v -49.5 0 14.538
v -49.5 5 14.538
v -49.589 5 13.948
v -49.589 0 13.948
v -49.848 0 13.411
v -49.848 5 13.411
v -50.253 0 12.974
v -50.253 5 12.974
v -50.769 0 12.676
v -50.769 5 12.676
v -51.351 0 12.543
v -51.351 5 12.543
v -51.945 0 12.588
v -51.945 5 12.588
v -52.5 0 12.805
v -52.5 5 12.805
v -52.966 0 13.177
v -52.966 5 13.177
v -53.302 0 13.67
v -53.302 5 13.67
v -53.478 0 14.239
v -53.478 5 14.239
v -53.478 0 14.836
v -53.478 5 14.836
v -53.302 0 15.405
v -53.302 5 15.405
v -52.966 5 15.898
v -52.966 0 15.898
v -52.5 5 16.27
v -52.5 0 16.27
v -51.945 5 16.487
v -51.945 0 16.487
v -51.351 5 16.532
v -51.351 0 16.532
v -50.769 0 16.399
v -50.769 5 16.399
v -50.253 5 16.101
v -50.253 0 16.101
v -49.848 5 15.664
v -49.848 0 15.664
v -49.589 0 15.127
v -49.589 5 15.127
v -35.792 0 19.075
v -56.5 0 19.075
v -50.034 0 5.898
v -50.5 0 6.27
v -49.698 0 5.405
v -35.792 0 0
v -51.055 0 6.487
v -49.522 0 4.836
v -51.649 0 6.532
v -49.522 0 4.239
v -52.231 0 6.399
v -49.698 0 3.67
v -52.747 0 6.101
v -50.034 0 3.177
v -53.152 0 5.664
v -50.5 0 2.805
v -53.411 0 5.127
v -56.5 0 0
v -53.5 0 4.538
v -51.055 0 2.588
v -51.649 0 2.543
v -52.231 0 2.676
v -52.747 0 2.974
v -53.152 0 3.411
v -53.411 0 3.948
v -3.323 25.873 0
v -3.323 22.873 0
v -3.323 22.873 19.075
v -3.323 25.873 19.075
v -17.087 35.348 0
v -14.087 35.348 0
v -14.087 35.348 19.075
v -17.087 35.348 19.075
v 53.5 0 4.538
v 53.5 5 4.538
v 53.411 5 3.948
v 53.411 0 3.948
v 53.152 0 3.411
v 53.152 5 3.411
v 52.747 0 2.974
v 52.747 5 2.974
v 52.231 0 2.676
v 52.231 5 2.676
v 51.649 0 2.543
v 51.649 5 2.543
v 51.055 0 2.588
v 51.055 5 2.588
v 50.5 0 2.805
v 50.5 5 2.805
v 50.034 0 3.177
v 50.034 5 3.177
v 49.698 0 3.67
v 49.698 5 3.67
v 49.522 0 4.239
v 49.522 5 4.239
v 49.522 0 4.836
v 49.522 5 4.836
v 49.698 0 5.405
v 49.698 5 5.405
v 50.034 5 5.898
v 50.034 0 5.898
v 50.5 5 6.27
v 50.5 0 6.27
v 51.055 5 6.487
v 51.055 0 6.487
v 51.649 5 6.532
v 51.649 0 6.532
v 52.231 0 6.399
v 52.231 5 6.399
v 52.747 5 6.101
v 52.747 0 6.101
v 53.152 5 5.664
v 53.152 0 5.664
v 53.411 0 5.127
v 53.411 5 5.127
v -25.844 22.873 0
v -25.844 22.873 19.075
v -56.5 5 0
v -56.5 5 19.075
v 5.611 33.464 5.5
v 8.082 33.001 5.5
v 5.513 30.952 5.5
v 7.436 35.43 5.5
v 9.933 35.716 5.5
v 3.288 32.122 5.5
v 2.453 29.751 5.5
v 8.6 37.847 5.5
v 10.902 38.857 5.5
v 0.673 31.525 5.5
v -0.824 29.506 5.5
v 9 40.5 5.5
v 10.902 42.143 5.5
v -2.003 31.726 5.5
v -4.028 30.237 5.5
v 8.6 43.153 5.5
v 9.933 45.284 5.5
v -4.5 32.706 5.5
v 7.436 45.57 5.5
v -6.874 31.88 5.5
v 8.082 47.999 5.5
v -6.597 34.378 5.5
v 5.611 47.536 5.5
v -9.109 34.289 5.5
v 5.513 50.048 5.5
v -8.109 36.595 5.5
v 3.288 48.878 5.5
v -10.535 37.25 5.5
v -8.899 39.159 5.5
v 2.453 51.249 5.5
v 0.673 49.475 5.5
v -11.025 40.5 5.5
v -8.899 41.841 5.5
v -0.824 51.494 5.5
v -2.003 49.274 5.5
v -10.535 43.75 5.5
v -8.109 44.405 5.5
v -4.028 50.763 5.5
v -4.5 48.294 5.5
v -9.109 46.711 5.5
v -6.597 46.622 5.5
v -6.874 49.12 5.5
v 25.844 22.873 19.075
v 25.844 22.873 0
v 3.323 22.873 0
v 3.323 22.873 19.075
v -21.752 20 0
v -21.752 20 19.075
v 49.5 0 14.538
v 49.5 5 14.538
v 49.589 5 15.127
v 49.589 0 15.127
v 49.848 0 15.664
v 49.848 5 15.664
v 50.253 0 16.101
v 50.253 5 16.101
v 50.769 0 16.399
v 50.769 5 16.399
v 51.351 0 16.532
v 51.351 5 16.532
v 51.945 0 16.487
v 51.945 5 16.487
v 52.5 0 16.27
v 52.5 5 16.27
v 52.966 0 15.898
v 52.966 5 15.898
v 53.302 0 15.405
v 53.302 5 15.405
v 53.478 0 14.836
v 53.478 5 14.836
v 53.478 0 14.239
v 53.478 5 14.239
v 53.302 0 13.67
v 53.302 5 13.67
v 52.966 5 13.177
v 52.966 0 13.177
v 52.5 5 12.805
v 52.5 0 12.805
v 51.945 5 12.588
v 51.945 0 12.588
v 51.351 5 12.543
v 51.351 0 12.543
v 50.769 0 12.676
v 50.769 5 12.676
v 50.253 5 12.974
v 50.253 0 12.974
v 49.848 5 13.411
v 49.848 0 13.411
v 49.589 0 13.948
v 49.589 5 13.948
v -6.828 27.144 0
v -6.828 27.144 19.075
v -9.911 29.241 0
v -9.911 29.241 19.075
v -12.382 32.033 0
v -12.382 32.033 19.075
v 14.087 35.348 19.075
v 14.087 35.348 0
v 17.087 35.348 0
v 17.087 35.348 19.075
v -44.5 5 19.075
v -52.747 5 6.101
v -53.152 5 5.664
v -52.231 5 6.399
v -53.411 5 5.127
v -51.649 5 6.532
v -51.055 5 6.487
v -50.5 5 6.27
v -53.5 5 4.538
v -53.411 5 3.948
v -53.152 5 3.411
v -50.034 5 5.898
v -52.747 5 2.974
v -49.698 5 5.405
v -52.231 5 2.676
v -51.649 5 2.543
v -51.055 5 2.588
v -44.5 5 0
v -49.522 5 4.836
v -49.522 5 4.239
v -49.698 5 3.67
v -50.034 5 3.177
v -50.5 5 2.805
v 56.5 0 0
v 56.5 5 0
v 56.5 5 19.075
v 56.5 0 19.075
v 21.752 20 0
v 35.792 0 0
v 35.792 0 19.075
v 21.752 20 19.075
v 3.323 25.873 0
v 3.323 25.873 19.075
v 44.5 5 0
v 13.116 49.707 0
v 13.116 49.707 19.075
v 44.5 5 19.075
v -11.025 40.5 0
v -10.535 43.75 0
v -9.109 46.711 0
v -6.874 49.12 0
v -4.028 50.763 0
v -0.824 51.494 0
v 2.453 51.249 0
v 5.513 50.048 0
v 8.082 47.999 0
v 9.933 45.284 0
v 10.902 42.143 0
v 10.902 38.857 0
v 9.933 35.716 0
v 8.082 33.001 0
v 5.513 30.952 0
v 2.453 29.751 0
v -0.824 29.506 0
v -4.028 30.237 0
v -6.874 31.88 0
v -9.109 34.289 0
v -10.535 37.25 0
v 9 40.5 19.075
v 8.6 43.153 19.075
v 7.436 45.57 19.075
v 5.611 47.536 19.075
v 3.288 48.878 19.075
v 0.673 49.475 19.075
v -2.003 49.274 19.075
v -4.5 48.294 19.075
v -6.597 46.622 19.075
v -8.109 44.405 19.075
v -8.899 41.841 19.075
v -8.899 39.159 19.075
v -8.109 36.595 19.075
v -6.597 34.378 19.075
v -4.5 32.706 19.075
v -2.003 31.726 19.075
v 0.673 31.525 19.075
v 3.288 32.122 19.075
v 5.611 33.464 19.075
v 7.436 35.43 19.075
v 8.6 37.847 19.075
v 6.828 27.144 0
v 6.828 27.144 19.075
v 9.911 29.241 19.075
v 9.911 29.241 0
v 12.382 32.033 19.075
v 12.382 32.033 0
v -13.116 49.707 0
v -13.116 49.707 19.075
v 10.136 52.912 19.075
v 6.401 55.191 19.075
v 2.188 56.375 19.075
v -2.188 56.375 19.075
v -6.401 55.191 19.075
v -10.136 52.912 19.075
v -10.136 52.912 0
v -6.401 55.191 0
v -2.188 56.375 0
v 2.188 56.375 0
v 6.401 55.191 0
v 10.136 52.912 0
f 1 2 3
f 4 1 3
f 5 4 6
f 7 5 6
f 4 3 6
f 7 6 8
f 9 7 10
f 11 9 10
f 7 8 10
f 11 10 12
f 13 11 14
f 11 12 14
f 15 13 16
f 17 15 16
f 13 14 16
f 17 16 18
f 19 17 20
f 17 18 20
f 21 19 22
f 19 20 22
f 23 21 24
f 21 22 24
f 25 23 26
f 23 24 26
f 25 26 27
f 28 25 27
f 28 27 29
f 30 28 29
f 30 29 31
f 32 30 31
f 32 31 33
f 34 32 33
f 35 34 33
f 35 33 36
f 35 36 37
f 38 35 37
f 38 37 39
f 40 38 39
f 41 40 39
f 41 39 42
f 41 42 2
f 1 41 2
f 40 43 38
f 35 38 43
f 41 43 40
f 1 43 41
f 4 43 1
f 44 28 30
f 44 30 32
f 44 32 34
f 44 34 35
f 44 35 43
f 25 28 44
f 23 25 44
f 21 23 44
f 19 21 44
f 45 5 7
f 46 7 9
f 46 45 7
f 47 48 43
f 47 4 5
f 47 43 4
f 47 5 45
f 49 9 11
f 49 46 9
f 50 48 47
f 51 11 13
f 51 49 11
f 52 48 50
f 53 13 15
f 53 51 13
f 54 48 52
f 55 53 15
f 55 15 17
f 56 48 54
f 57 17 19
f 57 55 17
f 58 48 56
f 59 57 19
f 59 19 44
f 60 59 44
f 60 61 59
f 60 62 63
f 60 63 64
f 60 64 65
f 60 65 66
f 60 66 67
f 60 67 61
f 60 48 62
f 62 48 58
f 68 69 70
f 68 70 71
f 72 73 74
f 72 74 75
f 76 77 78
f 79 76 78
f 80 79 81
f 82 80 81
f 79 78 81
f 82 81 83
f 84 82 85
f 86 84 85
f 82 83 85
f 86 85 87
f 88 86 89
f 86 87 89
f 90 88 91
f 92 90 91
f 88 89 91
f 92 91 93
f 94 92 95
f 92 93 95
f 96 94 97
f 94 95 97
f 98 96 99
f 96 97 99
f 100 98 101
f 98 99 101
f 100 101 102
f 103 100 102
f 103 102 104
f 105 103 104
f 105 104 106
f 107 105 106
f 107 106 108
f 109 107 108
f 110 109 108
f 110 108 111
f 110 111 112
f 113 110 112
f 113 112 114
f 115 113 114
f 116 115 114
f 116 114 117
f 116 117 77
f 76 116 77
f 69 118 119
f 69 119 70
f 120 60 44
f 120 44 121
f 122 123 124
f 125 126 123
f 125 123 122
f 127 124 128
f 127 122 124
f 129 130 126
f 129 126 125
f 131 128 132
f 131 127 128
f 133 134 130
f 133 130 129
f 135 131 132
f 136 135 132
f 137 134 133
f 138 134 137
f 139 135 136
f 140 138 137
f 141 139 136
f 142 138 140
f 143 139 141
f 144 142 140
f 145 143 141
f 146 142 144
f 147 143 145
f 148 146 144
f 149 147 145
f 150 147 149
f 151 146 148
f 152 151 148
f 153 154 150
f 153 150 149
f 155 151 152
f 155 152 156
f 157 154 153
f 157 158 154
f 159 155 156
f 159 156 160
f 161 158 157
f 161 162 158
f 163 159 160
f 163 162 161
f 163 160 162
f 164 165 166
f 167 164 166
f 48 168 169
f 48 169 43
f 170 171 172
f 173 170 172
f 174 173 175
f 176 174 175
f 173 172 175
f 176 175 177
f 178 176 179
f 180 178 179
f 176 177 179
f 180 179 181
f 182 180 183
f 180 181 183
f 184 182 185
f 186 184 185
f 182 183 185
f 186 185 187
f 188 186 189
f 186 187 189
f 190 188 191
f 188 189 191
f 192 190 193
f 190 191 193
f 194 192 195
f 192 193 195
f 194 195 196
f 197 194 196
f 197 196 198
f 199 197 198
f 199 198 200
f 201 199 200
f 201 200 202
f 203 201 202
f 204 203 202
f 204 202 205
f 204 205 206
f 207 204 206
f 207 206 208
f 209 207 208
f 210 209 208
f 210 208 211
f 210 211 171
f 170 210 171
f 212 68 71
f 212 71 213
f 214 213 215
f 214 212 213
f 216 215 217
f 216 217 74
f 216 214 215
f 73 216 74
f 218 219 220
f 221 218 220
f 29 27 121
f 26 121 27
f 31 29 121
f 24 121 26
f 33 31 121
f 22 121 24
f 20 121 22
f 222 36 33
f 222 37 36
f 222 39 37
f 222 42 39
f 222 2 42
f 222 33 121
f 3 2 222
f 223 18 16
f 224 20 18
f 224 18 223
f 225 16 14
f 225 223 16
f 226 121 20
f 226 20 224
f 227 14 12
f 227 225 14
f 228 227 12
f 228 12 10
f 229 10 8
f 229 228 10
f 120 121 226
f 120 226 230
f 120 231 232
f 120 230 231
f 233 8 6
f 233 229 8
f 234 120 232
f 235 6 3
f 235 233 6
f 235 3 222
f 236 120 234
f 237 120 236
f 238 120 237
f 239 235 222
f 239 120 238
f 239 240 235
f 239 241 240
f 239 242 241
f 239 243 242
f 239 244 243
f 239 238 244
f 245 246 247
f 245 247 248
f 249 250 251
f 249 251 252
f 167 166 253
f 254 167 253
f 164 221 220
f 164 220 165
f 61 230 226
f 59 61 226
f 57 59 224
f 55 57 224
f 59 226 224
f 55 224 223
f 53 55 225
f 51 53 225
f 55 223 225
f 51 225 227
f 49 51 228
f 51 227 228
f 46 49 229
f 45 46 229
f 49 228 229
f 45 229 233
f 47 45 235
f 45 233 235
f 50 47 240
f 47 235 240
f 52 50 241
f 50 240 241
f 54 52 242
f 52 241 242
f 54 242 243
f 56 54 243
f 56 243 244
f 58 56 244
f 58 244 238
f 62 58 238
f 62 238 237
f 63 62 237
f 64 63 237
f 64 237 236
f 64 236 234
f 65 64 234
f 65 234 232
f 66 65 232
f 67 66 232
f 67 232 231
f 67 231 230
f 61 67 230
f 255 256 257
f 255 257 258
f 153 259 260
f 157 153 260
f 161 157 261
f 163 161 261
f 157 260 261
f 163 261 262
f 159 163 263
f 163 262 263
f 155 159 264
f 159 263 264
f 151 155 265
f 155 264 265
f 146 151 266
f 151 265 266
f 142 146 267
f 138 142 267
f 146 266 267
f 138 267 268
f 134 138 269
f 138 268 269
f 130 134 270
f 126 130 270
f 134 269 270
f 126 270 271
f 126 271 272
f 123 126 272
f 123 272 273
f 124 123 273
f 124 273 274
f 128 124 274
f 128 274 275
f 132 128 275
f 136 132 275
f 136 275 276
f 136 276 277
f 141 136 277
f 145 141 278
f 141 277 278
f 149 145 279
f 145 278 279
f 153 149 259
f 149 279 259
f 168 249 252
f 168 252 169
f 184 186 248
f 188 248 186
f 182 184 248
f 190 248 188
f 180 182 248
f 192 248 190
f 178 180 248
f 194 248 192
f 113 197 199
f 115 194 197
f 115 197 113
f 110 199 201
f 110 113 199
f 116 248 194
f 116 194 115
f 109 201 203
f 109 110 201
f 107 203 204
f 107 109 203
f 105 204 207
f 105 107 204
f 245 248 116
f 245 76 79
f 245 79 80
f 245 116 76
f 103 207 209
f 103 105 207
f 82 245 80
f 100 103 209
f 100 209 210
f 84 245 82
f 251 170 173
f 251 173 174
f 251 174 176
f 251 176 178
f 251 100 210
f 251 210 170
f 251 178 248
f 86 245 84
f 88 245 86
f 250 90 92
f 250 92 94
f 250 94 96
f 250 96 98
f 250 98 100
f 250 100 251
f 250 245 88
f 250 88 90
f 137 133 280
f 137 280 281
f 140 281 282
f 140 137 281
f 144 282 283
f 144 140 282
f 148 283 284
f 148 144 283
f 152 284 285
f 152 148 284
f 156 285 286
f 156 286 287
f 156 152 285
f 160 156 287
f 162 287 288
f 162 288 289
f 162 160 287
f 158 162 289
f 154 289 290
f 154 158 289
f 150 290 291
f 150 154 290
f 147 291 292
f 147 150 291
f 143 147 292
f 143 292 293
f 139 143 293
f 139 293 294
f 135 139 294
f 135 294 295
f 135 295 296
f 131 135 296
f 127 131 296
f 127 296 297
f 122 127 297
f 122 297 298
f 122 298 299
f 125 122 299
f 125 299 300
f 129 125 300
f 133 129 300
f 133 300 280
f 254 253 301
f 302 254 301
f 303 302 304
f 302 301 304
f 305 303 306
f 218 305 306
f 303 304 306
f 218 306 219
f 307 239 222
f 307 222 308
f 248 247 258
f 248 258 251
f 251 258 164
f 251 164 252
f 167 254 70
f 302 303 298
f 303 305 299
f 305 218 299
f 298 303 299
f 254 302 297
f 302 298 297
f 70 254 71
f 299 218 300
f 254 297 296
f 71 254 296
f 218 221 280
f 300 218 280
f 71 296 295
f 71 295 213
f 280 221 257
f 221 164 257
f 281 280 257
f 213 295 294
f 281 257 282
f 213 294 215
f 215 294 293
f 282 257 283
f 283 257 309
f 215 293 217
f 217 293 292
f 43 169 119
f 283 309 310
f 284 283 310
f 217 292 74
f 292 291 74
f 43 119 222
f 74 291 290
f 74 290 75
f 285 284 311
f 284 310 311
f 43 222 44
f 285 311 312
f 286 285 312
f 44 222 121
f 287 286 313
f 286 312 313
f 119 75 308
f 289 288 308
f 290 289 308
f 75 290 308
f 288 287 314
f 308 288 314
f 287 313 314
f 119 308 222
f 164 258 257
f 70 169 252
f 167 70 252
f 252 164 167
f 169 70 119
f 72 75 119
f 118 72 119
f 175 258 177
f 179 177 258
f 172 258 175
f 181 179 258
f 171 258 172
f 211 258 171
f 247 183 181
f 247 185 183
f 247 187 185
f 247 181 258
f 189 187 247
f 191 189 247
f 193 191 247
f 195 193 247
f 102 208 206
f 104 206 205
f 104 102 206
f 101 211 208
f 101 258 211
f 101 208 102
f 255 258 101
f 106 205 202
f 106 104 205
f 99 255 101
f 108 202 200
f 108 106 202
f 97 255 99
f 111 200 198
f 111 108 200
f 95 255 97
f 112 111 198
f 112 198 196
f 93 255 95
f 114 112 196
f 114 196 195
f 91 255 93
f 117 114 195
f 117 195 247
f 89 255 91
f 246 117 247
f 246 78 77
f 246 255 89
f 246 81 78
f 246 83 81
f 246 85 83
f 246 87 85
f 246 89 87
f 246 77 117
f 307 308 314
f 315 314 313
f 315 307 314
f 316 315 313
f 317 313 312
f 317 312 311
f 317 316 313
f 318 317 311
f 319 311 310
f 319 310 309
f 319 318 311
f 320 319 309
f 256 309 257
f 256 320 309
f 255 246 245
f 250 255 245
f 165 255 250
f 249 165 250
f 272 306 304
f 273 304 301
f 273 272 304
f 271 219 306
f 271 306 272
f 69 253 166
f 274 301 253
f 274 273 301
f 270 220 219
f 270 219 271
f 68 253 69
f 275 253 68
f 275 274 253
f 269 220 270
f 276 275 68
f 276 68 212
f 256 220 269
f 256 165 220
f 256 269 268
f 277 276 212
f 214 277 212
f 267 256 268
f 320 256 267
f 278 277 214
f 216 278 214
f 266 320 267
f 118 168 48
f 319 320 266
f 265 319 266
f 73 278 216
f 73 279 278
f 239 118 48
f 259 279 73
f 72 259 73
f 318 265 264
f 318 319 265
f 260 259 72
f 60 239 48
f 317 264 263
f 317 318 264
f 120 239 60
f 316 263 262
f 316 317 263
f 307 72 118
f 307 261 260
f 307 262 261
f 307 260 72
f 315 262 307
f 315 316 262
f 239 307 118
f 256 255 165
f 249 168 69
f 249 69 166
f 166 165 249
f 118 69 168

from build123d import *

# Parameters (mm, degrees)
ESQUISSE1_R             = 9
BOSS_EXTRU_1_DEPTH      = 19.075
ESQUISSE2_R             = 11.025
ENL_V_MAT_EXTRU_1_DEPTH = 5.5
ESQUISSE6_R             = 2
ENL_V_MAT_EXTRU_5_DEPTH = 6


with BuildPart() as part:
    # Esquisse1 → Boss.-Extru.1 (new body)
    with BuildSketch(Plane.XY):
        with BuildLine():
            Line((-56.5, 0), (-56.5, 5))
            Line((-56.5, 5), (-44.5, 5))
            Line((-44.5, 5), (-13.11591162, 49.70725189))
            ThreePointArc((-13.11591162, 49.70725189), (0, 56.525), (13.11591162, 49.70725189))
            Line((13.11591162, 49.70725189), (44.5, 5))
            Line((44.5, 5), (56.5, 5))
            Line((56.5, 5), (56.5, 0))
            Line((56.5, 0), (35.791970863, 0))
            Line((35.791970863, 0), (21.7521509, 20))
            Line((21.7521509, 20), (-21.7521509, 20))
            Line((-21.7521509, 20), (-35.791970863, 0))
            Line((-35.791970863, 0), (-56.5, 0))
        make_face()
        with Locations((0, 40.5)):
            Circle(ESQUISSE1_R, mode=Mode.SUBTRACT)
        with BuildLine():
            Line((-17.087305896, 35.347543053), (-25.844479018, 22.872777501))
            Line((-25.844479018, 22.872777501), (-3.323305878, 22.872777501))
            Line((-3.323305878, 22.872777501), (-3.323305878, 25.872777501))
            ThreePointArc((-3.323305878, 25.872777501), (-9.910860011, 29.240566007), (-14.087305896, 35.347543053))
            Line((-14.087305896, 35.347543053), (-17.087305896, 35.347543053))
        make_face(mode=Mode.SUBTRACT)
        with BuildLine():
            Line((17.087305896, 35.347543053), (25.844479018, 22.872777501))
            Line((25.844479018, 22.872777501), (3.323305878, 22.872777501))
            Line((3.323305878, 22.872777501), (3.323305878, 25.872777501))
            ThreePointArc((3.323305878, 25.872777501), (9.910860011, 29.240566007), (14.087305896, 35.347543053))
            Line((14.087305896, 35.347543053), (17.087305896, 35.347543053))
        make_face(mode=Mode.SUBTRACT)
    extrude(amount=BOSS_EXTRU_1_DEPTH)

    # Esquisse2 → Enlèv. mat.-Extru.1 (cut)
    with BuildSketch(Plane(origin=(0, 0, 0), x_dir=(-1, 0, 0), z_dir=(0, 0, -1))):
        with Locations((0, 40.5)):
            Circle(ESQUISSE2_R)
    extrude(amount=-ENL_V_MAT_EXTRU_1_DEPTH, mode=Mode.SUBTRACT)

    # Esquisse6 → Enlèv. mat.-Extru.5 (cut, through all)
    with BuildSketch(Plane(origin=(0, 5, 0), x_dir=(1, 0, 0), z_dir=(0, 1, 0))):
        with Locations(Location((-51.5, -4.5375, 0), (0, 0, 180))):  # turned: the seam where the file's is
            Circle(ESQUISSE6_R)
        with Locations((51.5, -4.5375)):
            Circle(ESQUISSE6_R)
        with Locations(Location((51.5, -14.5375, 0), (0, 0, 180))):  # turned: the seam where the file's is
            Circle(ESQUISSE6_R)
        with Locations((-51.5, -14.5375)):
            Circle(ESQUISSE6_R)
    extrude(amount=-ENL_V_MAT_EXTRU_5_DEPTH, mode=Mode.SUBTRACT)


solid = part.part
